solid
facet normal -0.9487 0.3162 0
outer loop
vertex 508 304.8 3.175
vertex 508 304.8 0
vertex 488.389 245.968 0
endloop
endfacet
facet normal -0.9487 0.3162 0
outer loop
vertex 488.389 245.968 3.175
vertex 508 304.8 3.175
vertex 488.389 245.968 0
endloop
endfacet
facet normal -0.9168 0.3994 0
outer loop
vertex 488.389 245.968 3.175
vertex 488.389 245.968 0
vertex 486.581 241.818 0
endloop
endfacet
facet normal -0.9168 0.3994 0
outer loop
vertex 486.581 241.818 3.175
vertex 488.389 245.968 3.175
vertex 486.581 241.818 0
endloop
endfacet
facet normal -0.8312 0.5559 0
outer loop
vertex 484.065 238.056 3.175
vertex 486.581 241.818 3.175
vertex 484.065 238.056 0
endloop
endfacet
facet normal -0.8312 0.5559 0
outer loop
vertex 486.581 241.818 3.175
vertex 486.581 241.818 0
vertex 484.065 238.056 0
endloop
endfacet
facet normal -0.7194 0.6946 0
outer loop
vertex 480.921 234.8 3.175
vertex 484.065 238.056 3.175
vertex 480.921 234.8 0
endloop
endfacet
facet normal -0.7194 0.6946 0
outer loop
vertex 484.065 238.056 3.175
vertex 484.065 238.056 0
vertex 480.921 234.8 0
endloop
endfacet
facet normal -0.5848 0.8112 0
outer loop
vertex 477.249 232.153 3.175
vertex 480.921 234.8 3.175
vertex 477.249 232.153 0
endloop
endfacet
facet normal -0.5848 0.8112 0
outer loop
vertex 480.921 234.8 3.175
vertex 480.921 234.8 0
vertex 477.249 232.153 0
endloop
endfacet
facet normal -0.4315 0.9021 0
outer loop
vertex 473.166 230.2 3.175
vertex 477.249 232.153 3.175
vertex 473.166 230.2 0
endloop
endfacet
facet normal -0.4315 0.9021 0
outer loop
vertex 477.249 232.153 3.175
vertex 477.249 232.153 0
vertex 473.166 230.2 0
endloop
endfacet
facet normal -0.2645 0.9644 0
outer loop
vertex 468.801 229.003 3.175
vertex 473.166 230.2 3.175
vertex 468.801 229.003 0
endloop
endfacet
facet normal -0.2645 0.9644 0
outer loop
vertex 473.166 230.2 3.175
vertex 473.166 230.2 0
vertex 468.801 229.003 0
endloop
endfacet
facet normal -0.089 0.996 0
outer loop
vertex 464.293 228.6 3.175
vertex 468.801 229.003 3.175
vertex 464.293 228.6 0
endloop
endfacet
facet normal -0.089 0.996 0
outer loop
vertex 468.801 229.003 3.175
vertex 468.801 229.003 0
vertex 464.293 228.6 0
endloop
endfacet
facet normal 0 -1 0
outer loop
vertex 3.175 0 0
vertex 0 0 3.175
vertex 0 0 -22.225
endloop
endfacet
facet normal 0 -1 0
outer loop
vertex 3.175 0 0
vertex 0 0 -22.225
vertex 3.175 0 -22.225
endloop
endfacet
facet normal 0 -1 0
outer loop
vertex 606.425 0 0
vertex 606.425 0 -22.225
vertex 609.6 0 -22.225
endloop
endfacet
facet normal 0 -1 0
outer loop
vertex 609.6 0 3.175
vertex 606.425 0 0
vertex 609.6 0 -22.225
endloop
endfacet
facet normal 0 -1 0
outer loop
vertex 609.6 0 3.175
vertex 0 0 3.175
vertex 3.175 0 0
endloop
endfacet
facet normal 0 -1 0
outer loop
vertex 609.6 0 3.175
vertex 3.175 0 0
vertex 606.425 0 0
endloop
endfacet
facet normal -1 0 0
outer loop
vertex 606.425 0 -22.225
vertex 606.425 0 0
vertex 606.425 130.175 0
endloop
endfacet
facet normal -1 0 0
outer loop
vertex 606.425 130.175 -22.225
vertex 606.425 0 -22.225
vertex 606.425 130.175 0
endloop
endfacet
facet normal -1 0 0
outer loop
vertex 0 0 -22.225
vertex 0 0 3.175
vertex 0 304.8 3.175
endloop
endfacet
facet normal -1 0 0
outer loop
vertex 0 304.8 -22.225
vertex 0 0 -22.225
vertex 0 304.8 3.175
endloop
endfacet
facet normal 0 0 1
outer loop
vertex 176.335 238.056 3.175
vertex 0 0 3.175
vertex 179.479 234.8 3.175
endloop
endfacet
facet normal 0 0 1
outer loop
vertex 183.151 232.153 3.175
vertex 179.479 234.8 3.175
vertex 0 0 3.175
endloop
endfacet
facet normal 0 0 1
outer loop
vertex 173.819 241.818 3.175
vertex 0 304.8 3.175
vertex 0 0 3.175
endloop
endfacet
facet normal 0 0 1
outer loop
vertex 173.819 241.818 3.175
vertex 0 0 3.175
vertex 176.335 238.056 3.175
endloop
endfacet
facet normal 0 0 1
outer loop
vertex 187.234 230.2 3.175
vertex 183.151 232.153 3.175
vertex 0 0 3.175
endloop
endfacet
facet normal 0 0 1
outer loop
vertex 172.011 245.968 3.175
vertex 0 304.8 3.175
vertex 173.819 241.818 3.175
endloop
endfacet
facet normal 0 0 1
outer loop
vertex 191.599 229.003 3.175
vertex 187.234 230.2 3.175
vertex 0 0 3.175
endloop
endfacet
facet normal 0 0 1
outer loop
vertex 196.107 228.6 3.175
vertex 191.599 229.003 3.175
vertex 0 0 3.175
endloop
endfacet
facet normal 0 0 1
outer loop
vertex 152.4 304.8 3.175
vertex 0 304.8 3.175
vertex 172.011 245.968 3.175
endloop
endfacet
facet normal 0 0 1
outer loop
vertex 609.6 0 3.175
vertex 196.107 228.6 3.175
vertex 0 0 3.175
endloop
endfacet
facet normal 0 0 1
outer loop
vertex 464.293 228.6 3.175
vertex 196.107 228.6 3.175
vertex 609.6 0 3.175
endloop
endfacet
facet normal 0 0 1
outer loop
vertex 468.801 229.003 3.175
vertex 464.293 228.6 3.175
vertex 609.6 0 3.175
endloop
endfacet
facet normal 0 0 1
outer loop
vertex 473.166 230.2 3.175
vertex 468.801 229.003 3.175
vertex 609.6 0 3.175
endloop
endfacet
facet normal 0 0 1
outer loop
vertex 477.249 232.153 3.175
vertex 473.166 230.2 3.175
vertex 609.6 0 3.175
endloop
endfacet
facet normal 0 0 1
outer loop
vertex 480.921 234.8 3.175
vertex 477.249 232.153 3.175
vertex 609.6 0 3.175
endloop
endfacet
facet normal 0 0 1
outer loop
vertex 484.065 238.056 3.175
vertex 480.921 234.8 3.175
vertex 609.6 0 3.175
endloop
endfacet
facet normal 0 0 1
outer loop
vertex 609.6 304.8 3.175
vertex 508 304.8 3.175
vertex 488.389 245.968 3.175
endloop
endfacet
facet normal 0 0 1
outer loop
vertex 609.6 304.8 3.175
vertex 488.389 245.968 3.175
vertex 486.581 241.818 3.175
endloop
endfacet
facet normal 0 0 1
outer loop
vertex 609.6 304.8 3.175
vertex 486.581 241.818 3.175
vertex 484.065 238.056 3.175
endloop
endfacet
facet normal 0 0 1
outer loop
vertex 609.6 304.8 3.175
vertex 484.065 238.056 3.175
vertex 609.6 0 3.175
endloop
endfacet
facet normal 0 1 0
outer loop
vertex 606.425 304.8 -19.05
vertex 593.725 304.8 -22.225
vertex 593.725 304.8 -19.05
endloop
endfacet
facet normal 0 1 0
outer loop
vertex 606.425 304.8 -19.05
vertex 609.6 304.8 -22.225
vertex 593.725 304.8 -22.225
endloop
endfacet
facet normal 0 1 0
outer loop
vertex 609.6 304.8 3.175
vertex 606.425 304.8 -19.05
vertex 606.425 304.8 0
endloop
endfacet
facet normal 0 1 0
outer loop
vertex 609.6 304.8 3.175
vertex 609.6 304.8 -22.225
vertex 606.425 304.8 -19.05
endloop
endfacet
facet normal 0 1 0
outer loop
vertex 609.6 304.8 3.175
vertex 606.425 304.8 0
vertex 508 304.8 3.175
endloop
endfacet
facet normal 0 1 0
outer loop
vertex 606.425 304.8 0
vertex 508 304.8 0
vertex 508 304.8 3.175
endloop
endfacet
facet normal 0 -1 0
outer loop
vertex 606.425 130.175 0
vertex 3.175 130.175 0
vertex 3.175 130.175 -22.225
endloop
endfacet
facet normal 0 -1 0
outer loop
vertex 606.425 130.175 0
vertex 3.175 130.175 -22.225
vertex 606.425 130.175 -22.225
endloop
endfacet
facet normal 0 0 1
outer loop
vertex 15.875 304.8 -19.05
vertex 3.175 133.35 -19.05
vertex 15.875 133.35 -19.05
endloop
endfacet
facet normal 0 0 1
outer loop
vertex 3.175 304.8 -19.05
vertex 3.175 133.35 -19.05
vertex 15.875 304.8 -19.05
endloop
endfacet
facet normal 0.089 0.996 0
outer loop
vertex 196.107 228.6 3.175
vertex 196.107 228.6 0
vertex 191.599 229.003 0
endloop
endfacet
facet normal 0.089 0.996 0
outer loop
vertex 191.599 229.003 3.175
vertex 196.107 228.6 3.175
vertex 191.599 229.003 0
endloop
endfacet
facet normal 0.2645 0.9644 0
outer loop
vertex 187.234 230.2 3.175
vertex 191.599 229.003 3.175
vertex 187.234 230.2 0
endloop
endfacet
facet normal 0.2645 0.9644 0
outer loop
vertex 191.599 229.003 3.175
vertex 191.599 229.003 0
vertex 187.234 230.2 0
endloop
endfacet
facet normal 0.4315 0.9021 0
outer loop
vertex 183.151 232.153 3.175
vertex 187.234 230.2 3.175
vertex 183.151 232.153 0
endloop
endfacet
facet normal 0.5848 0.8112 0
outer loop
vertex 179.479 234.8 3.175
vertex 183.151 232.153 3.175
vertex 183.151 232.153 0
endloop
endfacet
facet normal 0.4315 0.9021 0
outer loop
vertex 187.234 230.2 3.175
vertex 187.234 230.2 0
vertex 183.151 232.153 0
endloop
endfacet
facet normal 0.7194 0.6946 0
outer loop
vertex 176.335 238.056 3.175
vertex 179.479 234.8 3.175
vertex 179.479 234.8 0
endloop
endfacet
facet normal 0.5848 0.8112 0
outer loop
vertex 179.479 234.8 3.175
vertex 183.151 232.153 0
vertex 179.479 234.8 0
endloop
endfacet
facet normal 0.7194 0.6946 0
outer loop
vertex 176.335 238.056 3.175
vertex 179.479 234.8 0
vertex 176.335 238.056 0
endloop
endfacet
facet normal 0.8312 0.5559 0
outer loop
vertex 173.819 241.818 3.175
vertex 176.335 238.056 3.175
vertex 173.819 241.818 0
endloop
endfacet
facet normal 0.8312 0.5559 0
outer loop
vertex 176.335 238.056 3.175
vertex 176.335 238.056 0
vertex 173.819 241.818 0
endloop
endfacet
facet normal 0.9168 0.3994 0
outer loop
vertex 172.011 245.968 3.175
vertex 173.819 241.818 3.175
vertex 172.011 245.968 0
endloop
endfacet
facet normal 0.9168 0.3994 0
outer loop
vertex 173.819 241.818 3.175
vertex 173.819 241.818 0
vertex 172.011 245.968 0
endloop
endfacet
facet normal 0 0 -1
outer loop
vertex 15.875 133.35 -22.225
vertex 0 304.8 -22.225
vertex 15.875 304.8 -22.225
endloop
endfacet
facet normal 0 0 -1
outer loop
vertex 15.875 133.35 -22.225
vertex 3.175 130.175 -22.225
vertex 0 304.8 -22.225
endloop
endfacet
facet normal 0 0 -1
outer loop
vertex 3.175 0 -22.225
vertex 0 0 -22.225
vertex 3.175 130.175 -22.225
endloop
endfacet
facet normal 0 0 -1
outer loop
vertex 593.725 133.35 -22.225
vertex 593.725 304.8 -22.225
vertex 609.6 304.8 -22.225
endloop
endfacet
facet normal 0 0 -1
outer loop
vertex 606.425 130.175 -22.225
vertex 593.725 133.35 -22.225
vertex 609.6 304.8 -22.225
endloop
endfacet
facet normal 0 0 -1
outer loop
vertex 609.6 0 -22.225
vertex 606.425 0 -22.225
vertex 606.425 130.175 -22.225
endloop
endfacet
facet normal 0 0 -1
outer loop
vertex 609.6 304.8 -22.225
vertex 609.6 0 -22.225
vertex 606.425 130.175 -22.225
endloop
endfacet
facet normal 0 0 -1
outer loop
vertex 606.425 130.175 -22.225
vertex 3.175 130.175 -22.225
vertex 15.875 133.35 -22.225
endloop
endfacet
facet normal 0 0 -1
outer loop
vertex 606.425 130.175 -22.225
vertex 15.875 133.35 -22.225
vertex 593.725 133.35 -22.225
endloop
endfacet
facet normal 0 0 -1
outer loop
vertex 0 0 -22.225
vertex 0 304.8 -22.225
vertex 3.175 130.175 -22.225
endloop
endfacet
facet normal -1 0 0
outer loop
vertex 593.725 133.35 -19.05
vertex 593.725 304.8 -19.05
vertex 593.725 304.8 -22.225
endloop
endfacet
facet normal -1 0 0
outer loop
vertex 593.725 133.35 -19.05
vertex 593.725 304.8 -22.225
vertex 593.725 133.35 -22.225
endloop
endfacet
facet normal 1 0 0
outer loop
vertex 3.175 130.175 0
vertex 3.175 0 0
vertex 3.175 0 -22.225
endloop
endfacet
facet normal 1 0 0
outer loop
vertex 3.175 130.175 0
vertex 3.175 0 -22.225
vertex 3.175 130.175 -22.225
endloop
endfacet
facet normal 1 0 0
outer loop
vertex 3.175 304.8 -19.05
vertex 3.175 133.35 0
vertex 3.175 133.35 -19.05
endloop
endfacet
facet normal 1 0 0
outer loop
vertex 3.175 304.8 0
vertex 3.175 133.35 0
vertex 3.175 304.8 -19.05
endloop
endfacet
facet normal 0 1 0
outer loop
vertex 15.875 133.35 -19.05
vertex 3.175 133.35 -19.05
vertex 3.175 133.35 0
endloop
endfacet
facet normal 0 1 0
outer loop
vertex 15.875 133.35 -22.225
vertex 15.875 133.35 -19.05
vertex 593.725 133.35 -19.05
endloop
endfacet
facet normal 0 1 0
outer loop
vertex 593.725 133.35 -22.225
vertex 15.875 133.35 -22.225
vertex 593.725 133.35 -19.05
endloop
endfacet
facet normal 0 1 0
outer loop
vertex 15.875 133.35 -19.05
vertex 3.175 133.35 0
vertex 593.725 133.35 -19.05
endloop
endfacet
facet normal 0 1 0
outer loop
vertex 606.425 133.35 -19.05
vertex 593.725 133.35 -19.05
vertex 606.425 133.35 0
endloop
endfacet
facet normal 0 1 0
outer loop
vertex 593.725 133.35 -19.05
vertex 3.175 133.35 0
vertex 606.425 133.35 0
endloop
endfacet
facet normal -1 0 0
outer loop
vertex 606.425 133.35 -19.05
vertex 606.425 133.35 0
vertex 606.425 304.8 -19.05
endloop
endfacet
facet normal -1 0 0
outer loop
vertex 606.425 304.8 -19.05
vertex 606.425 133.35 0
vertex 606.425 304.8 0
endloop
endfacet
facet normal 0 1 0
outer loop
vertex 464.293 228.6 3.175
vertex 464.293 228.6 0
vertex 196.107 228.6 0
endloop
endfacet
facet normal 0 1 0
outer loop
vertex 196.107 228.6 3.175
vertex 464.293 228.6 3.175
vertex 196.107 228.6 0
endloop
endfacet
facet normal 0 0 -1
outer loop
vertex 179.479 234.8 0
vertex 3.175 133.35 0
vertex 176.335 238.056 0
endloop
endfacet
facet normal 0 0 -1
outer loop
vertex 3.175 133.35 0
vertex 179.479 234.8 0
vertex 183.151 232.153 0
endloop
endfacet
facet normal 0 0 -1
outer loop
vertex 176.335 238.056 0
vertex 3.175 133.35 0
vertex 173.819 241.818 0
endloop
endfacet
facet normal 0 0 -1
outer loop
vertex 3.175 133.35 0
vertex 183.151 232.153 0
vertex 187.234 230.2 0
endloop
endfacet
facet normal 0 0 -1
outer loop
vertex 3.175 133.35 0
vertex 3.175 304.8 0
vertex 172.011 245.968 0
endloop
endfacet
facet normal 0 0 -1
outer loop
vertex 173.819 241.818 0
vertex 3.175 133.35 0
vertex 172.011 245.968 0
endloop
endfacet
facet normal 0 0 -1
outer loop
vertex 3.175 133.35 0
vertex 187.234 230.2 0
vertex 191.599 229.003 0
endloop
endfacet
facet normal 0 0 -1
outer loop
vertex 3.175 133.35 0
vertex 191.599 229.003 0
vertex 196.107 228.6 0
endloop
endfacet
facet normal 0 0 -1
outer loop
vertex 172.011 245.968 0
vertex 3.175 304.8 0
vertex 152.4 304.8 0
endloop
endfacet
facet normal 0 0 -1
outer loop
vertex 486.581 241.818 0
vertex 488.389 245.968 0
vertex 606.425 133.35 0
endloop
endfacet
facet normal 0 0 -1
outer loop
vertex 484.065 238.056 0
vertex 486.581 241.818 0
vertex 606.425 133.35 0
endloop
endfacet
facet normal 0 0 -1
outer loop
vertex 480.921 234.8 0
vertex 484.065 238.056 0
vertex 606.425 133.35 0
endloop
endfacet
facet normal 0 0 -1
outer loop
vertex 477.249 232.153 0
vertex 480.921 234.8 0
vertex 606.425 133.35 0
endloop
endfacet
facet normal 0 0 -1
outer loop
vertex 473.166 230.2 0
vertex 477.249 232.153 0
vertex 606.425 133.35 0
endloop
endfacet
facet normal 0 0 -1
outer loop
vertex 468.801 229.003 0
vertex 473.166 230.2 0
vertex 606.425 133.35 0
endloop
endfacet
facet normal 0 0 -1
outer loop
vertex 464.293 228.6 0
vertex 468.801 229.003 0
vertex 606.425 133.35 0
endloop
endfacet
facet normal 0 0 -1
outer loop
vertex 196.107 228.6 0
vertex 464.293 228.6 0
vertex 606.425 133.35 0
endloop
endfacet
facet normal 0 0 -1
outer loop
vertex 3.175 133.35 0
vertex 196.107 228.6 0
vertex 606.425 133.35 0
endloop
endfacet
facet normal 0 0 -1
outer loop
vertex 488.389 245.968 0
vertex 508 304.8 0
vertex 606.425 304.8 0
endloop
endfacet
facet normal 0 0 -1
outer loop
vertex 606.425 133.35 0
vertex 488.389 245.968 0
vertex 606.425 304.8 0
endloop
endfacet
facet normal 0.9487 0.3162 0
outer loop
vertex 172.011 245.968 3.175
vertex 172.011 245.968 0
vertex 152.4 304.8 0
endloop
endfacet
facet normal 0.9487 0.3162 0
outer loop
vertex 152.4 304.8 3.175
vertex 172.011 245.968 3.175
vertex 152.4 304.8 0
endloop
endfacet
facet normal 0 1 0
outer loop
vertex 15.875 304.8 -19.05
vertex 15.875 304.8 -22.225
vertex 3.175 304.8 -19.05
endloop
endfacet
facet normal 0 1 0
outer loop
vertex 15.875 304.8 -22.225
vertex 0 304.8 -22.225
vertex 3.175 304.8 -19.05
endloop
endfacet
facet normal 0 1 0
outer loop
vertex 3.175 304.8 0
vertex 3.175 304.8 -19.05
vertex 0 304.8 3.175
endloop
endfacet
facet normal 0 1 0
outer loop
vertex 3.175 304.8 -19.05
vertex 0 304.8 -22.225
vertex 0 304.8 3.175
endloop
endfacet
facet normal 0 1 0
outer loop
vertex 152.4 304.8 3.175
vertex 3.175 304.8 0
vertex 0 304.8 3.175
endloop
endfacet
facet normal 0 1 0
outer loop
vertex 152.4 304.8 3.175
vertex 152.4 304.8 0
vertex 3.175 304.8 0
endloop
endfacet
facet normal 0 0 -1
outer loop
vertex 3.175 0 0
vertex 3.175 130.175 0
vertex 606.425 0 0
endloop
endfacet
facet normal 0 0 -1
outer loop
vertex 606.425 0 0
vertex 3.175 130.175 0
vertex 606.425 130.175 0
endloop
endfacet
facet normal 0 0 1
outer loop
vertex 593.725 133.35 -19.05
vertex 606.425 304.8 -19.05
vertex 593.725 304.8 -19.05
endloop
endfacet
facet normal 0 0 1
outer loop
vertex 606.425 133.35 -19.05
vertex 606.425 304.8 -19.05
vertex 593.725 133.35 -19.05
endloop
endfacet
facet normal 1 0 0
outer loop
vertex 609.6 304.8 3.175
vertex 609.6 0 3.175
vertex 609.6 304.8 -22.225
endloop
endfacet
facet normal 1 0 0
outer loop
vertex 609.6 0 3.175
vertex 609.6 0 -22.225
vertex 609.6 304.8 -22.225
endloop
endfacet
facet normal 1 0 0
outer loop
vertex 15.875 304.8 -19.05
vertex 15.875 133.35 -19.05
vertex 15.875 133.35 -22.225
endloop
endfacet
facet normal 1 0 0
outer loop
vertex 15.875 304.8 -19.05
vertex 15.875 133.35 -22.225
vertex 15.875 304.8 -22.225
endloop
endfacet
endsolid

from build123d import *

# Parameters (mm, degrees)
F1_DEPTH = 3.175
F2_W     = 3.175
F2_H     = 304.8
F3_DEPTH = 22.225
F4_W     = 171.45
F4_H     = 3.175
F6_DEPTH = 12.7
F5_W     = 171.45
F5_H     = 3.175
F7_DEPTH = 12.7
F8_W     = 603.25
F8_H     = 3.175
F9_DEPTH = 22.225


with BuildPart() as f1:
    # F0 (on Top) → F1 (new body)
    with BuildSketch(Plane.XY):
        with BuildLine():
            Line((0, 304.8), (0, 0))
            Line((0, 0), (609.6, 0))
            Line((609.6, 0), (609.6, 304.8))
            Line((609.6, 304.8), (508, 304.8))
            Line((508, 304.8), (488.389272, 245.967815))
            ThreePointArc((488.389272, 245.967815), (479.144357, 233.394448), (464.292716, 228.6))
            Line((464.292716, 228.6), (196.107284, 228.6))
            ThreePointArc((196.107284, 228.6), (181.255643, 233.394448), (172.010728, 245.967815))
            Line((172.010728, 245.967815), (152.4, 304.8))
            Line((152.4, 304.8), (0, 304.8))
        make_face()
    extrude(amount=F1_DEPTH)

    # F2 (on face) → F3 (join)
    with BuildSketch(Plane.XY):
        with Locations((1.5875, 152.4)):
            Rectangle(F2_W, F2_H)
        with Locations((608.0125, 152.4)):
            Rectangle(F2_W, F2_H)
    extrude(amount=-F3_DEPTH)

    # F4 (on face) → F6 (join)
    with BuildSketch(Plane(origin=(606.425, 0, 0), x_dir=(0, -1, 0), z_dir=(-1, 0, 0))):
        with Locations((-219.075, -20.6375)):
            Rectangle(F4_W, F4_H)
    extrude(amount=F6_DEPTH)

    # F5 (on face) → F7 (join)
    with BuildSketch(Plane.YZ.offset(3.175)):
        with Locations((219.075, -20.6375)):
            Rectangle(F5_W, F5_H)
    extrude(amount=F7_DEPTH)

    # F8 (on face) → F9 (join, through all)
    with BuildSketch(Plane(origin=(0, 0, 0), x_dir=(1, 0, 0), z_dir=(0, 0, -1))):
        with Locations((304.8, -131.7625)):
            Rectangle(F8_W, F8_H)
    extrude(amount=F9_DEPTH)


solid = f1.part
